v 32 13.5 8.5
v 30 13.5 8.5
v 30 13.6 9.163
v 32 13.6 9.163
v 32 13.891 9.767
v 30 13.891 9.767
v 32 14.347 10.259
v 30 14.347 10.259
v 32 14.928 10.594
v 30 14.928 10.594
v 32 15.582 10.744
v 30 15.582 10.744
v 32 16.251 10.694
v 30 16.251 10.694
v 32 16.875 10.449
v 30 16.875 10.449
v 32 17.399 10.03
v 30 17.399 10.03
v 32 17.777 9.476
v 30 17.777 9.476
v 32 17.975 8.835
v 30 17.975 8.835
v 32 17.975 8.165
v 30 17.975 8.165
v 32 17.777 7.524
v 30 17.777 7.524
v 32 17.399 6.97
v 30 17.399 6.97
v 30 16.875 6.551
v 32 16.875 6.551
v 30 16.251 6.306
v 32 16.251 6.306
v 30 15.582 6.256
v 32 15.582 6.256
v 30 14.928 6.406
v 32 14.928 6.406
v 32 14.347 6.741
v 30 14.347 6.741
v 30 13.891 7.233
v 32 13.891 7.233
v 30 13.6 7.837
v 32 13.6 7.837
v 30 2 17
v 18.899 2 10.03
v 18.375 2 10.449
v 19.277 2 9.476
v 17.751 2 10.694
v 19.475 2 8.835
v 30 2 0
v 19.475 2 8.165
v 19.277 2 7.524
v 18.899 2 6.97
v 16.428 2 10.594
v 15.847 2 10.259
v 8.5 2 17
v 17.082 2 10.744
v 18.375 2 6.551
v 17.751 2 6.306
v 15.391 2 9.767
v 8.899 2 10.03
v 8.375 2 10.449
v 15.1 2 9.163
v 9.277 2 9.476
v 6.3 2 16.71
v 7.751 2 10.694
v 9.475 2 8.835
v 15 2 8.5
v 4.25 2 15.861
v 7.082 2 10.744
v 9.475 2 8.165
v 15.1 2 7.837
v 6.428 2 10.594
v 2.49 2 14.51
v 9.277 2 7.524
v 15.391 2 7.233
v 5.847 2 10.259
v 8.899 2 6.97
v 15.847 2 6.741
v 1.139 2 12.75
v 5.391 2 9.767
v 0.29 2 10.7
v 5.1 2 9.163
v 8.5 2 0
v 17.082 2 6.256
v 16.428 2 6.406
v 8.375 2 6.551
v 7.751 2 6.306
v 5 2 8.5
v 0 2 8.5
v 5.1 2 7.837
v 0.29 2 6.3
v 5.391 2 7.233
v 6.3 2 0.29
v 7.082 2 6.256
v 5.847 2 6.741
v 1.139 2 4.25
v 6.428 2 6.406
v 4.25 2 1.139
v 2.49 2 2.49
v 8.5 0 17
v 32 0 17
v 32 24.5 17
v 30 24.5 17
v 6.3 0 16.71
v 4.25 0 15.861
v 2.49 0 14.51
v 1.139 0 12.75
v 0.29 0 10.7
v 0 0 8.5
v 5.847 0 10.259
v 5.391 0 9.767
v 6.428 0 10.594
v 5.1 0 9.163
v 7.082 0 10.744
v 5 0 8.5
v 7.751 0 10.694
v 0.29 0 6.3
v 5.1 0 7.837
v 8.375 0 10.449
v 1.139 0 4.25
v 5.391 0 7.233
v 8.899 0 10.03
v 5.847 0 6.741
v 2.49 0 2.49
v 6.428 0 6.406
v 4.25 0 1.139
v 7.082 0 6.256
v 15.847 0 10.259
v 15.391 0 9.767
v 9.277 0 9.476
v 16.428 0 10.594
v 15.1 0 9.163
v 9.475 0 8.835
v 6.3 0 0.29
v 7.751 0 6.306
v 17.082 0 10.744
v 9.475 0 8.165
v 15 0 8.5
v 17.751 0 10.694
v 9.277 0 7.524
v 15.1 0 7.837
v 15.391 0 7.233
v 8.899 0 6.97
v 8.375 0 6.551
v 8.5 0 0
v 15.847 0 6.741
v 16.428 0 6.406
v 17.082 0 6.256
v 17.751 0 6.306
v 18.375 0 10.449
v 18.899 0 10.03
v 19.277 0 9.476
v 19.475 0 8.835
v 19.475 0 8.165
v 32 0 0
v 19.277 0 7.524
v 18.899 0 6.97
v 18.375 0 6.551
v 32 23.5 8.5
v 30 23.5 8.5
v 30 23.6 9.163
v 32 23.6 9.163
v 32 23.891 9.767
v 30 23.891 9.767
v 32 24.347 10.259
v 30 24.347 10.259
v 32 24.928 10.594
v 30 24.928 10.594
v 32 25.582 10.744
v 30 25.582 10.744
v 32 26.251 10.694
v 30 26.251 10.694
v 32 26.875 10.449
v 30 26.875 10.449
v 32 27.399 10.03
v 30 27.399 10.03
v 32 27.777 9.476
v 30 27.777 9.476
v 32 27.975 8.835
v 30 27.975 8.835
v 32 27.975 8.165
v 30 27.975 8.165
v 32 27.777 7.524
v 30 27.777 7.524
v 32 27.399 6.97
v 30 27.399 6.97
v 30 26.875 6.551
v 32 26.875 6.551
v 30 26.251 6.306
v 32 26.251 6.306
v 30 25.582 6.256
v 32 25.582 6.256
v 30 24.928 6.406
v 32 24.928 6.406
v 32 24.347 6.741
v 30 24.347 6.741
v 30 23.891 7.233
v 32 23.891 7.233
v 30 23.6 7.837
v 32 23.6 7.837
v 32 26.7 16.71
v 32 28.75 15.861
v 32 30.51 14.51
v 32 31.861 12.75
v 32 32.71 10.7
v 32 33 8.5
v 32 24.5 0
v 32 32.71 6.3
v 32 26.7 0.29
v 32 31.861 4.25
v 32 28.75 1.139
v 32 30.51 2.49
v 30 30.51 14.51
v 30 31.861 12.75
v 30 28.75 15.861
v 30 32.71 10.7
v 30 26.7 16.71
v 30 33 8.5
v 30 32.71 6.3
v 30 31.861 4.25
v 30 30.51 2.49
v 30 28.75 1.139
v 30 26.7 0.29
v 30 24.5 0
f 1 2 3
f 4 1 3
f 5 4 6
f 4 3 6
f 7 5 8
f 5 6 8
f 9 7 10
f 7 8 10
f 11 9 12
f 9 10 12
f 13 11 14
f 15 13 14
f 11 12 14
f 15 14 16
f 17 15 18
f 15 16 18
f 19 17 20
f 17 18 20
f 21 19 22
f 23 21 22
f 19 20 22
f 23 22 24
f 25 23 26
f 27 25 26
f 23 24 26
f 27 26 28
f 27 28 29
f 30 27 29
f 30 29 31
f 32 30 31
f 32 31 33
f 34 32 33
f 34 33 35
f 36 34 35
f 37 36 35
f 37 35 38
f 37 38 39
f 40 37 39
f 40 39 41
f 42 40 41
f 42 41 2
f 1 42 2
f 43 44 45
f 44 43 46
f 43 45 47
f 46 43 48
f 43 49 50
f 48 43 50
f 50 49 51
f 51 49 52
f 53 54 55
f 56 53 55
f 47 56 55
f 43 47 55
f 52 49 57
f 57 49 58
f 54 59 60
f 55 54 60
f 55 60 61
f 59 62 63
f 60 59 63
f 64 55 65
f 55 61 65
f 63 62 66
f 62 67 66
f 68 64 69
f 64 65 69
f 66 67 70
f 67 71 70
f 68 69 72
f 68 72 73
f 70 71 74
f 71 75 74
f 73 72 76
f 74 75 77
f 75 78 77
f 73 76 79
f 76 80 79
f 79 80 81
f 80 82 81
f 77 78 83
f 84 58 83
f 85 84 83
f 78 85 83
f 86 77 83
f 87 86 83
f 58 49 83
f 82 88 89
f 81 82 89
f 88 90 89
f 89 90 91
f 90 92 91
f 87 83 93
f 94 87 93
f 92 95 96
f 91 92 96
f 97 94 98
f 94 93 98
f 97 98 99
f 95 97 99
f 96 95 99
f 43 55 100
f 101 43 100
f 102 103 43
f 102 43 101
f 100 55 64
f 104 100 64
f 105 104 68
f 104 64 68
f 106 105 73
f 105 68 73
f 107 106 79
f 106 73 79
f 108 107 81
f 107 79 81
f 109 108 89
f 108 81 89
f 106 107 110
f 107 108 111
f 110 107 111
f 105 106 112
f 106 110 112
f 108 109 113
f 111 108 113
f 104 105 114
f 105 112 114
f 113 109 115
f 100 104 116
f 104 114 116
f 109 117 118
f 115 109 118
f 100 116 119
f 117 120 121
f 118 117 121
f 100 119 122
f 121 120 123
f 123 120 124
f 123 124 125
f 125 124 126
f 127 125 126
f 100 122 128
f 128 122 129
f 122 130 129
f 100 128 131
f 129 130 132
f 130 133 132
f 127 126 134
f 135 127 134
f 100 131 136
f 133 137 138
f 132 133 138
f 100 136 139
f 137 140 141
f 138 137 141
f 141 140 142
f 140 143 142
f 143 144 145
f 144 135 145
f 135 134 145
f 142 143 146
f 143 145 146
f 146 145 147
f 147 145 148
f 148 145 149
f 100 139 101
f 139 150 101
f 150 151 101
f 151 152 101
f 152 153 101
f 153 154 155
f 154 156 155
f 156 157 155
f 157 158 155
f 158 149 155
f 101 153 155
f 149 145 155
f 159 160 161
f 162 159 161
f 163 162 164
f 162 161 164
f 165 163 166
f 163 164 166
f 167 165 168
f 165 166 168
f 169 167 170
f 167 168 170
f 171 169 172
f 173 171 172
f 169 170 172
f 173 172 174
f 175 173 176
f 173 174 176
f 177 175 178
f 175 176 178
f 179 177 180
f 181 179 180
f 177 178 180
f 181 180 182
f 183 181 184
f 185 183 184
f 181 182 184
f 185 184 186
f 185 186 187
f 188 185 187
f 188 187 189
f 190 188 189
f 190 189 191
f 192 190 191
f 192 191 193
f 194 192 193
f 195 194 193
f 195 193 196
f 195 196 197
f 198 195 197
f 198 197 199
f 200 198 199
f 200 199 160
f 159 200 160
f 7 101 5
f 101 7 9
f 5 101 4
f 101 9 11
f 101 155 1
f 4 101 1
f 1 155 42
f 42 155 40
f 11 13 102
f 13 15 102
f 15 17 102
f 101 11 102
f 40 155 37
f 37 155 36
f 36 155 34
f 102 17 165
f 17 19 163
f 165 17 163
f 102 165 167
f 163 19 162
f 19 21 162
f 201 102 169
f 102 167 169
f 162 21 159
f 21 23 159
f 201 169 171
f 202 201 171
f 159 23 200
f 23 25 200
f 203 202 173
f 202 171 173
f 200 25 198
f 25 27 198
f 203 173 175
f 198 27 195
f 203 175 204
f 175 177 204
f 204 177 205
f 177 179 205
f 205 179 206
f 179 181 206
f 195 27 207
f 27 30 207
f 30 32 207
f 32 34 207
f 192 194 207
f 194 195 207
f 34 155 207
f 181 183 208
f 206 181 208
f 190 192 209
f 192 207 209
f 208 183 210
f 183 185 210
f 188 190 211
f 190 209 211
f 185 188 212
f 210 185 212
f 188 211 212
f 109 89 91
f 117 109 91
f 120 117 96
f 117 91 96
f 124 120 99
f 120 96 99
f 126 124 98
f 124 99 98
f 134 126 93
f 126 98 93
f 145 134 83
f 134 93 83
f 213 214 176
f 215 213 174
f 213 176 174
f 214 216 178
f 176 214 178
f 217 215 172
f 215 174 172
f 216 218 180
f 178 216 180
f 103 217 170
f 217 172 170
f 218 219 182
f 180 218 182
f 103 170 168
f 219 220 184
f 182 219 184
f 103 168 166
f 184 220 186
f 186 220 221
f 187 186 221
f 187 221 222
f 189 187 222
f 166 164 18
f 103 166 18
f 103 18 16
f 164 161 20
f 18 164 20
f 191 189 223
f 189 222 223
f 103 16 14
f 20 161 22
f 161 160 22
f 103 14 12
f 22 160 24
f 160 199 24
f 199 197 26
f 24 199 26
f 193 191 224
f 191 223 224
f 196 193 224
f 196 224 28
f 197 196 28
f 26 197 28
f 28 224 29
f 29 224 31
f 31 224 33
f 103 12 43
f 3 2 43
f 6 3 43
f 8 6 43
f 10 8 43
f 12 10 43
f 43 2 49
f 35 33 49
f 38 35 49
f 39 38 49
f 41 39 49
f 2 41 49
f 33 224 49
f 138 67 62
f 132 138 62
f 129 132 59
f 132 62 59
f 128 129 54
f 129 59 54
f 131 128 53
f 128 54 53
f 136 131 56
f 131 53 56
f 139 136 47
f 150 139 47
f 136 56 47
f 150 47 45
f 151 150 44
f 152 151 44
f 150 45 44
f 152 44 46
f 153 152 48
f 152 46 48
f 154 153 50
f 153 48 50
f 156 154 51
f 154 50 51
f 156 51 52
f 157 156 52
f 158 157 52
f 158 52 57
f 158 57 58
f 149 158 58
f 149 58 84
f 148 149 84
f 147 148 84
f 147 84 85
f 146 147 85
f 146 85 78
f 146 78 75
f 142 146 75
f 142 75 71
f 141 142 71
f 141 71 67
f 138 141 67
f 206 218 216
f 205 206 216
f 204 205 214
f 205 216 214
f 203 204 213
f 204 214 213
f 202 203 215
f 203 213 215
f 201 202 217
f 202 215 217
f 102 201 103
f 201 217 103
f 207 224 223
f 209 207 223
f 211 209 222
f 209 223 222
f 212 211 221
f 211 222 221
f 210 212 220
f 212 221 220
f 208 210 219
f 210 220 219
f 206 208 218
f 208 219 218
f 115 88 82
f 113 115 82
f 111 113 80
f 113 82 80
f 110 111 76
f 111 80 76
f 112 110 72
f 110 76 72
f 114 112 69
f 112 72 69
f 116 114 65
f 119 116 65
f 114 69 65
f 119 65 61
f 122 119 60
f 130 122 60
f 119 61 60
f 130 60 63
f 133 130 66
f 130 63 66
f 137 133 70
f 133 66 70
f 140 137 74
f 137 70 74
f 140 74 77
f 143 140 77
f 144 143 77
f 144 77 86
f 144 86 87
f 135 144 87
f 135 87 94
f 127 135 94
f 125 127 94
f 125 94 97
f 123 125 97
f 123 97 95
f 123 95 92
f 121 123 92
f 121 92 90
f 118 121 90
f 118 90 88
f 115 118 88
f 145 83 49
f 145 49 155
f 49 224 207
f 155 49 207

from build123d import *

# Parameters (mm, degrees)
BOSS_EXTRU_1_DEPTH      = 17
ENL_V_MAT_EXTRU_1_DEPTH = 48.728398255
ENL_V_MAT_EXTRU_2_DEPTH = 48.68647607
ESQUISSE4_R             = 2.25
ENL_V_MAT_EXTRU_3_DEPTH = 48.728398255
ESQUISSE5_R             = 2.25
ENL_V_MAT_EXTRU_4_DEPTH = 48.68647607


with BuildPart() as part:
    # Esquisse1 → Boss.-Extru.1 (new body)
    with BuildSketch(Plane.XY):
        Polygon((0, 0), (32, 0), (32, 33), (30, 33), (30, 2), (0, 2), align=None)
    extrude(amount=BOSS_EXTRU_1_DEPTH)

    # Esquisse2 → Enlèv. mat.-Extru.1 (cut, through all)
    with BuildSketch(Plane.ZY.offset(-30)):
        with BuildLine():
            ThreePointArc((8.5, 33), (14.51040764, 30.51040764), (17, 24.5))
            Line((17, 24.5), (17, 33))
            Line((17, 33), (8.5, 33))
        make_face()
        with BuildLine():
            Line((0, 33), (0, 24.5))
            ThreePointArc((0, 24.5), (2.48959236, 30.51040764), (8.5, 33))
            Line((8.5, 33), (0, 33))
        make_face()
    extrude(amount=-ENL_V_MAT_EXTRU_1_DEPTH, mode=Mode.SUBTRACT)

    # Esquisse3 → Enlèv. mat.-Extru.2 (cut, through all)
    with BuildSketch(Plane(origin=(0, 2, 0), x_dir=(1, 0, 0), z_dir=(0, 1, 0))):
        with BuildLine():
            ThreePointArc((8.5, -17), (2.48959236, -14.51040764), (0, -8.5))
            Line((0, -8.5), (0, -17))
            Line((0, -17), (8.5, -17))
        make_face()
        with BuildLine():
            ThreePointArc((0, -8.5), (2.48959236, -2.48959236), (8.5, 0))
            Line((8.5, 0), (0, 0))
            Line((0, 0), (0, -8.5))
        make_face()
    extrude(amount=-ENL_V_MAT_EXTRU_2_DEPTH, mode=Mode.SUBTRACT)

    # Esquisse4 → Enlèv. mat.-Extru.3 (cut, through all)
    with BuildSketch(Plane.ZY.offset(-30)):
        with Locations(Location((8.5, 25.75, 0), (0, 0, 270))):
            Circle(ESQUISSE4_R)
        with Locations(Location((8.5, 15.75, 0), (0, 0, 270))):
            Circle(ESQUISSE4_R)
    extrude(amount=-ENL_V_MAT_EXTRU_3_DEPTH, mode=Mode.SUBTRACT)

    # Esquisse5 → Enlèv. mat.-Extru.4 (cut, through all)
    with BuildSketch(Plane(origin=(0, 2, 0), x_dir=(1, 0, 0), z_dir=(0, 1, 0))):
        with Locations(Location((7.25, -8.5, 0), (0, 0, 180))):
            Circle(ESQUISSE5_R)
        with Locations(Location((17.25, -8.5, 0), (0, 0, 180))):
            Circle(ESQUISSE5_R)
    extrude(amount=-ENL_V_MAT_EXTRU_4_DEPTH, mode=Mode.SUBTRACT)


solid = part.part
